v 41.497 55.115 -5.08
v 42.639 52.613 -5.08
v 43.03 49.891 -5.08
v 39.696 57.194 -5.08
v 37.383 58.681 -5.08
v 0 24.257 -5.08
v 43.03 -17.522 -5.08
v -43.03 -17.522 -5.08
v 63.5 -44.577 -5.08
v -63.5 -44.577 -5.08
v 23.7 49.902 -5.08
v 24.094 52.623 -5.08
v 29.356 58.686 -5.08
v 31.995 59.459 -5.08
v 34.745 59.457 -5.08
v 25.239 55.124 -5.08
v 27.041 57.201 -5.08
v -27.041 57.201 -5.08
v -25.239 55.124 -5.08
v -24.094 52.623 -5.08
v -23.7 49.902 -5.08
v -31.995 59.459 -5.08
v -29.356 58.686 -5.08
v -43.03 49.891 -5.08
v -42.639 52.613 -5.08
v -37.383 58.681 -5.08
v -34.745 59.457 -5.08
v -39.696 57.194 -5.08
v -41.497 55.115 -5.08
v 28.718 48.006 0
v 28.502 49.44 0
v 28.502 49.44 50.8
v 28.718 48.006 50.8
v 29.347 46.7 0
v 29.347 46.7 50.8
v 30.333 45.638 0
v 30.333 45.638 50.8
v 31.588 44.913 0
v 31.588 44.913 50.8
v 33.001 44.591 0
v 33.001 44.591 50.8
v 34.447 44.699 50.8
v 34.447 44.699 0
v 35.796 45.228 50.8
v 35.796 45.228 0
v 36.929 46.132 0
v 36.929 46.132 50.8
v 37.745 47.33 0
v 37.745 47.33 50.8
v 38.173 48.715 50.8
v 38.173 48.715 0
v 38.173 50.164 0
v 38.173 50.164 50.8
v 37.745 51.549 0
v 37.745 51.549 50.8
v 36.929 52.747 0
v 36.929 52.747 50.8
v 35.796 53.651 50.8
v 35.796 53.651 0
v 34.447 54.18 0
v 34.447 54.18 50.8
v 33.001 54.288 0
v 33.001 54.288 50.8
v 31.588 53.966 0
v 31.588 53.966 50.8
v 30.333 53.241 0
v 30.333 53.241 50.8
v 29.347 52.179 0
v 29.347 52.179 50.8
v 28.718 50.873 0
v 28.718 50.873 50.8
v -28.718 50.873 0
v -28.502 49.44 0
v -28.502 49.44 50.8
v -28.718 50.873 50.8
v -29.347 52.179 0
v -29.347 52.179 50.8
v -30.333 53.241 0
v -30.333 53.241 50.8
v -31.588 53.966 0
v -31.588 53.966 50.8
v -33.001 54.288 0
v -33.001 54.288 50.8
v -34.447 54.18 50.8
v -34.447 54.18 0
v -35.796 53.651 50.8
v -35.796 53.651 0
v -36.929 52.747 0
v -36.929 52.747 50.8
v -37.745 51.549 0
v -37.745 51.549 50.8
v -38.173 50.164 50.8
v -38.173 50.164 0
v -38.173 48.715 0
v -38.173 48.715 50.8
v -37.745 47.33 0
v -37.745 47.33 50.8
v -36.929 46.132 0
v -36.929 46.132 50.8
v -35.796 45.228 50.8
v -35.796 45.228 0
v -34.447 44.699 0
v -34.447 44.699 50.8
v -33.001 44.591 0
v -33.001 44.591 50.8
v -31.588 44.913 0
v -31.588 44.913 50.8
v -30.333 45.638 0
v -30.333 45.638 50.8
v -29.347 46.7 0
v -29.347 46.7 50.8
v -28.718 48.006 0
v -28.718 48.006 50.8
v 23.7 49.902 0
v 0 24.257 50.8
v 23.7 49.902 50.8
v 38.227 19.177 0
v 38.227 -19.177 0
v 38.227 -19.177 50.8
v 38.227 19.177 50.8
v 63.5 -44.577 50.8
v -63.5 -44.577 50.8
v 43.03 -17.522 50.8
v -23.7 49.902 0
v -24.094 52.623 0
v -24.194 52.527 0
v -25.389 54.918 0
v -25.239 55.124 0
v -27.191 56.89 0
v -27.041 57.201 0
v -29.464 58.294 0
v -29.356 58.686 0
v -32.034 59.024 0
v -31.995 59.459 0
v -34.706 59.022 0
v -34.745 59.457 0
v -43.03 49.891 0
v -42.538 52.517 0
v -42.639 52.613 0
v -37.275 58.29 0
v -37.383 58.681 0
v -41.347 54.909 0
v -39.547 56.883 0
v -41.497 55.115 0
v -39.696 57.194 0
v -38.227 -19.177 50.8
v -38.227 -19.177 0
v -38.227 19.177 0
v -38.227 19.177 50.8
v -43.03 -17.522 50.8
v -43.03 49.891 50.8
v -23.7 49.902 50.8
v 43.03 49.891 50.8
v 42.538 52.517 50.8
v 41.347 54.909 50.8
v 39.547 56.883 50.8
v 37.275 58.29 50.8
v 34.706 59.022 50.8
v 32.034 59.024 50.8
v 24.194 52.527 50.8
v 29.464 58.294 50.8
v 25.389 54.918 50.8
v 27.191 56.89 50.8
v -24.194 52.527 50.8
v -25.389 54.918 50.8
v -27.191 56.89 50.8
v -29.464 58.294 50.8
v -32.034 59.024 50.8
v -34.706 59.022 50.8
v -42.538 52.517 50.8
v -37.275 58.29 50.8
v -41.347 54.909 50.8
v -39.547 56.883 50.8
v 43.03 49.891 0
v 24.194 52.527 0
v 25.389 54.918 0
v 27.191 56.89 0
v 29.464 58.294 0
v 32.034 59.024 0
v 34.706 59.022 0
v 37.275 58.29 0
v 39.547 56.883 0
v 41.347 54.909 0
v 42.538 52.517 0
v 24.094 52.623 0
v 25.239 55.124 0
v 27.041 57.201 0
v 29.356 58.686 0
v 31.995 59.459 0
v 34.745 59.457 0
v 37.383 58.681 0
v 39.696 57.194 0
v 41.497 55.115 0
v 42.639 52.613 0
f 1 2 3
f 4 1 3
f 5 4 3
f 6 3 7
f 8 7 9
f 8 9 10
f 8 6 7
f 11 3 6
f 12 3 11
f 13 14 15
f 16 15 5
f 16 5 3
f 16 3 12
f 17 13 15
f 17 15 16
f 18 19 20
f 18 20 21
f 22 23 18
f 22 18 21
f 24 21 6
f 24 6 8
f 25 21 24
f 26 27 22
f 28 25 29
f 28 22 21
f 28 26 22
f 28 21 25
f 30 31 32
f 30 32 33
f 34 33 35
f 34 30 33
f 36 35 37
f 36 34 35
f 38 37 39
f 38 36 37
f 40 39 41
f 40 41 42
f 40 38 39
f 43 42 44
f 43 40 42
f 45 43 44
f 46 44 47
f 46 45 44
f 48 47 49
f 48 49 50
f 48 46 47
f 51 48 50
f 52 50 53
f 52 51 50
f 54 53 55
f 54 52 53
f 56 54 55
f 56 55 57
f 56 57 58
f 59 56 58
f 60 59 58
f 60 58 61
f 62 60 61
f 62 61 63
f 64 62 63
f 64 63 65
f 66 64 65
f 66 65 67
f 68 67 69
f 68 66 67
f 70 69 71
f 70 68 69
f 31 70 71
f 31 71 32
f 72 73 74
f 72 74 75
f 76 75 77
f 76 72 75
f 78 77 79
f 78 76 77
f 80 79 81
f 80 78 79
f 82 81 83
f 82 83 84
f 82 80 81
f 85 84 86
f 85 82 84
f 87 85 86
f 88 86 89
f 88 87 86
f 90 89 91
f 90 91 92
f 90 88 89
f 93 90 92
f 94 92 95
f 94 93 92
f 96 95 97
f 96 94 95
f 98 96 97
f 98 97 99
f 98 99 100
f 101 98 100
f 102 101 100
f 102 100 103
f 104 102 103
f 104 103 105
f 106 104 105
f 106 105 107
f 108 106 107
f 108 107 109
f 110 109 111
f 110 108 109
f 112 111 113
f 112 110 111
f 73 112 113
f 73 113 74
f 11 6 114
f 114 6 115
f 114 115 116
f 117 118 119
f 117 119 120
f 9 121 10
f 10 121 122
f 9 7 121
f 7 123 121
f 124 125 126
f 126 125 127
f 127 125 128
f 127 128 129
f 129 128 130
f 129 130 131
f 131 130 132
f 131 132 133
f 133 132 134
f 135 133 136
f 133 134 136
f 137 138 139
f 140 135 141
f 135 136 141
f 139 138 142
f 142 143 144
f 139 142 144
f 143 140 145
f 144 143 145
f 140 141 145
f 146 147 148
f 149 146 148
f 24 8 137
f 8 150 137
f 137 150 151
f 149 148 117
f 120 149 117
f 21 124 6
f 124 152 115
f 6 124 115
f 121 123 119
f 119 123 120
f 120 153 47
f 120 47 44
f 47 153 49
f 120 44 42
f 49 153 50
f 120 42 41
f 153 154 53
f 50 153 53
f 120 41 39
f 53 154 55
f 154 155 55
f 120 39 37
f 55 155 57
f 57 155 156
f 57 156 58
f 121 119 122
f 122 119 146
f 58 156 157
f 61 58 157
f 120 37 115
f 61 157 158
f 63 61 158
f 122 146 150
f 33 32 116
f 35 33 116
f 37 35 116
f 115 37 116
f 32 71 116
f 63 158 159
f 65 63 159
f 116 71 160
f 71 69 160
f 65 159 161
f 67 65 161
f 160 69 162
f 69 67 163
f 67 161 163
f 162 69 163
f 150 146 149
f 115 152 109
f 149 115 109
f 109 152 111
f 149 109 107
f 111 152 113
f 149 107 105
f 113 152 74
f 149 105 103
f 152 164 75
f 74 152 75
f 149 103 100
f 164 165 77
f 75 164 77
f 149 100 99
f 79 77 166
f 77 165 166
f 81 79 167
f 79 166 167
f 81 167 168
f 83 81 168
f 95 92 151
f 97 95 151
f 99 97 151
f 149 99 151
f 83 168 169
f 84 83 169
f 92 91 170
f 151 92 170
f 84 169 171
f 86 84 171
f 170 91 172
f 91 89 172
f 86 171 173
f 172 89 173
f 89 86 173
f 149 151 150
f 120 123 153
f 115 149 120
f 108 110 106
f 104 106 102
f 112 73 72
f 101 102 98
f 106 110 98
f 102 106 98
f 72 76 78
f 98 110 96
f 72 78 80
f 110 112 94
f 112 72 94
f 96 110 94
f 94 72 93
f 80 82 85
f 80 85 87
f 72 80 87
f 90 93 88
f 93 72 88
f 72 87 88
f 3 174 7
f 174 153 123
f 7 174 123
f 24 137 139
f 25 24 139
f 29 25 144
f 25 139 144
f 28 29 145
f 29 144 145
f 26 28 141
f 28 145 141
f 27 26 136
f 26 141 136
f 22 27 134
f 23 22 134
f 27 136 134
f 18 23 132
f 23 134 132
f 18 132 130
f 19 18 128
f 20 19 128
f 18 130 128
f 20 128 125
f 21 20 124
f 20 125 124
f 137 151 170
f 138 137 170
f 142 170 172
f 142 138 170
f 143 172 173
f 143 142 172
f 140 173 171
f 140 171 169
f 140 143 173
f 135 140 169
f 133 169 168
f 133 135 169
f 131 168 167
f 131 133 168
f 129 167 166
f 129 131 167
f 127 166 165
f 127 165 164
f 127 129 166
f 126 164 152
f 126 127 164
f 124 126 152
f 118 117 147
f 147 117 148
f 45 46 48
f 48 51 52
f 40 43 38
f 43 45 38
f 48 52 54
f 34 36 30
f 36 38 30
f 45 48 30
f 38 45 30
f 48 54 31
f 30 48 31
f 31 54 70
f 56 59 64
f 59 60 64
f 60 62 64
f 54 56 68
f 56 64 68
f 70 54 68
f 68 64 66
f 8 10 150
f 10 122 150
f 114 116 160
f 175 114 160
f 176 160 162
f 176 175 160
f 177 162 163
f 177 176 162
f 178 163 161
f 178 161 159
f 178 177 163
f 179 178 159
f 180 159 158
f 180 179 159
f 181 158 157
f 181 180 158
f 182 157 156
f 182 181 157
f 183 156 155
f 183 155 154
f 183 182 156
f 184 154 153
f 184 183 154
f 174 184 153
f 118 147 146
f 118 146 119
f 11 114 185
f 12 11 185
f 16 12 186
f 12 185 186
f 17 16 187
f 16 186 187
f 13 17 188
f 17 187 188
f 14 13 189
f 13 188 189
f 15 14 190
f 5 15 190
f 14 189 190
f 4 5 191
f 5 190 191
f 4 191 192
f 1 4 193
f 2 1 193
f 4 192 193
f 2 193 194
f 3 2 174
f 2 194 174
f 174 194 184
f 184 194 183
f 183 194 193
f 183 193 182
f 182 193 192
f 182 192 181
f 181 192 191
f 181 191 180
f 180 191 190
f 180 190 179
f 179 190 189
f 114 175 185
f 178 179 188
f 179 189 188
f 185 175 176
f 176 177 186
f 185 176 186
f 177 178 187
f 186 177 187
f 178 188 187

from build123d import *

# Parameters (mm, degrees)
SKETCH1_R           = 4.862500054
SKETCH1_W           = 76.454
SKETCH1_H           = 38.354
BOSS_EXTRUDE1_DEPTH = 50.8
BOSS_EXTRUDE2_DEPTH = 5.08


with BuildPart() as part:
    # Sketch1 → Boss-Extrude1 (new body)
    with BuildSketch(Plane.XY):
        with BuildLine():
            Line((-43.029964919, -17.522331458), (-43.029964919, 19.177))
            Line((-43.029964919, 19.177), (-43.029964919, 49.89109769))
            ThreePointArc((-43.029964919, 49.89109769), (-33.369881409, 59.115507734), (-23.699543278, 49.901848605))
            Line((-23.699543278, 49.901848605), (0, 24.257))
            Line((0, 24.257), (23.699543278, 49.901848605))
            ThreePointArc((23.699543278, 49.901848605), (33.369881409, 59.115507734), (43.029964919, 49.89109769))
            Line((43.029964919, 49.89109769), (43.029964919, 19.177))
            Line((43.029964919, 19.177), (43.029964919, -17.522331458))
            Line((43.029964919, -17.522331458), (63.5, -44.577))
            Line((63.5, -44.577), (-63.5, -44.577))
            Line((-63.5, -44.577), (-43.029964919, -17.522331458))
        make_face()
        with Locations((-33.364499946, 49.439500054)):
            Circle(SKETCH1_R, mode=Mode.SUBTRACT)
        with Locations(Location((33.364499946, 49.439500054, 0), (0, 0, 180))):
            Circle(SKETCH1_R, mode=Mode.SUBTRACT)
        Rectangle(SKETCH1_W, SKETCH1_H, mode=Mode.SUBTRACT)
    extrude(amount=BOSS_EXTRUDE1_DEPTH)

    # Sketch2 → Boss-Extrude2 (add)
    with BuildSketch(Plane(origin=(0, 0, 0), x_dir=(-1, 0, 0), z_dir=(0, 0, -1))):
        with BuildLine():
            Line((-43.029964919, 49.89109769), (-43.029964919, -17.522331458))
            Line((-43.029964919, -17.522331458), (-63.5, -44.577))
            Line((-63.5, -44.577), (63.5, -44.577))
            Line((63.5, -44.577), (43.029964919, -17.522331458))
            Line((43.029964919, -17.522331458), (43.029964919, 49.89109769))
            ThreePointArc((43.029964919, 49.89109769), (33.370126568, 59.556310005), (23.699543278, 49.901848605))
            Line((23.699543278, 49.901848605), (0, 24.257))
            Line((0, 24.257), (-23.699543278, 49.901848605))
            ThreePointArc((-23.699543278, 49.901848605), (-33.370126568, 59.556310005), (-43.029964919, 49.89109769))
        make_face()
    extrude(amount=BOSS_EXTRUDE2_DEPTH)


solid = part.part
